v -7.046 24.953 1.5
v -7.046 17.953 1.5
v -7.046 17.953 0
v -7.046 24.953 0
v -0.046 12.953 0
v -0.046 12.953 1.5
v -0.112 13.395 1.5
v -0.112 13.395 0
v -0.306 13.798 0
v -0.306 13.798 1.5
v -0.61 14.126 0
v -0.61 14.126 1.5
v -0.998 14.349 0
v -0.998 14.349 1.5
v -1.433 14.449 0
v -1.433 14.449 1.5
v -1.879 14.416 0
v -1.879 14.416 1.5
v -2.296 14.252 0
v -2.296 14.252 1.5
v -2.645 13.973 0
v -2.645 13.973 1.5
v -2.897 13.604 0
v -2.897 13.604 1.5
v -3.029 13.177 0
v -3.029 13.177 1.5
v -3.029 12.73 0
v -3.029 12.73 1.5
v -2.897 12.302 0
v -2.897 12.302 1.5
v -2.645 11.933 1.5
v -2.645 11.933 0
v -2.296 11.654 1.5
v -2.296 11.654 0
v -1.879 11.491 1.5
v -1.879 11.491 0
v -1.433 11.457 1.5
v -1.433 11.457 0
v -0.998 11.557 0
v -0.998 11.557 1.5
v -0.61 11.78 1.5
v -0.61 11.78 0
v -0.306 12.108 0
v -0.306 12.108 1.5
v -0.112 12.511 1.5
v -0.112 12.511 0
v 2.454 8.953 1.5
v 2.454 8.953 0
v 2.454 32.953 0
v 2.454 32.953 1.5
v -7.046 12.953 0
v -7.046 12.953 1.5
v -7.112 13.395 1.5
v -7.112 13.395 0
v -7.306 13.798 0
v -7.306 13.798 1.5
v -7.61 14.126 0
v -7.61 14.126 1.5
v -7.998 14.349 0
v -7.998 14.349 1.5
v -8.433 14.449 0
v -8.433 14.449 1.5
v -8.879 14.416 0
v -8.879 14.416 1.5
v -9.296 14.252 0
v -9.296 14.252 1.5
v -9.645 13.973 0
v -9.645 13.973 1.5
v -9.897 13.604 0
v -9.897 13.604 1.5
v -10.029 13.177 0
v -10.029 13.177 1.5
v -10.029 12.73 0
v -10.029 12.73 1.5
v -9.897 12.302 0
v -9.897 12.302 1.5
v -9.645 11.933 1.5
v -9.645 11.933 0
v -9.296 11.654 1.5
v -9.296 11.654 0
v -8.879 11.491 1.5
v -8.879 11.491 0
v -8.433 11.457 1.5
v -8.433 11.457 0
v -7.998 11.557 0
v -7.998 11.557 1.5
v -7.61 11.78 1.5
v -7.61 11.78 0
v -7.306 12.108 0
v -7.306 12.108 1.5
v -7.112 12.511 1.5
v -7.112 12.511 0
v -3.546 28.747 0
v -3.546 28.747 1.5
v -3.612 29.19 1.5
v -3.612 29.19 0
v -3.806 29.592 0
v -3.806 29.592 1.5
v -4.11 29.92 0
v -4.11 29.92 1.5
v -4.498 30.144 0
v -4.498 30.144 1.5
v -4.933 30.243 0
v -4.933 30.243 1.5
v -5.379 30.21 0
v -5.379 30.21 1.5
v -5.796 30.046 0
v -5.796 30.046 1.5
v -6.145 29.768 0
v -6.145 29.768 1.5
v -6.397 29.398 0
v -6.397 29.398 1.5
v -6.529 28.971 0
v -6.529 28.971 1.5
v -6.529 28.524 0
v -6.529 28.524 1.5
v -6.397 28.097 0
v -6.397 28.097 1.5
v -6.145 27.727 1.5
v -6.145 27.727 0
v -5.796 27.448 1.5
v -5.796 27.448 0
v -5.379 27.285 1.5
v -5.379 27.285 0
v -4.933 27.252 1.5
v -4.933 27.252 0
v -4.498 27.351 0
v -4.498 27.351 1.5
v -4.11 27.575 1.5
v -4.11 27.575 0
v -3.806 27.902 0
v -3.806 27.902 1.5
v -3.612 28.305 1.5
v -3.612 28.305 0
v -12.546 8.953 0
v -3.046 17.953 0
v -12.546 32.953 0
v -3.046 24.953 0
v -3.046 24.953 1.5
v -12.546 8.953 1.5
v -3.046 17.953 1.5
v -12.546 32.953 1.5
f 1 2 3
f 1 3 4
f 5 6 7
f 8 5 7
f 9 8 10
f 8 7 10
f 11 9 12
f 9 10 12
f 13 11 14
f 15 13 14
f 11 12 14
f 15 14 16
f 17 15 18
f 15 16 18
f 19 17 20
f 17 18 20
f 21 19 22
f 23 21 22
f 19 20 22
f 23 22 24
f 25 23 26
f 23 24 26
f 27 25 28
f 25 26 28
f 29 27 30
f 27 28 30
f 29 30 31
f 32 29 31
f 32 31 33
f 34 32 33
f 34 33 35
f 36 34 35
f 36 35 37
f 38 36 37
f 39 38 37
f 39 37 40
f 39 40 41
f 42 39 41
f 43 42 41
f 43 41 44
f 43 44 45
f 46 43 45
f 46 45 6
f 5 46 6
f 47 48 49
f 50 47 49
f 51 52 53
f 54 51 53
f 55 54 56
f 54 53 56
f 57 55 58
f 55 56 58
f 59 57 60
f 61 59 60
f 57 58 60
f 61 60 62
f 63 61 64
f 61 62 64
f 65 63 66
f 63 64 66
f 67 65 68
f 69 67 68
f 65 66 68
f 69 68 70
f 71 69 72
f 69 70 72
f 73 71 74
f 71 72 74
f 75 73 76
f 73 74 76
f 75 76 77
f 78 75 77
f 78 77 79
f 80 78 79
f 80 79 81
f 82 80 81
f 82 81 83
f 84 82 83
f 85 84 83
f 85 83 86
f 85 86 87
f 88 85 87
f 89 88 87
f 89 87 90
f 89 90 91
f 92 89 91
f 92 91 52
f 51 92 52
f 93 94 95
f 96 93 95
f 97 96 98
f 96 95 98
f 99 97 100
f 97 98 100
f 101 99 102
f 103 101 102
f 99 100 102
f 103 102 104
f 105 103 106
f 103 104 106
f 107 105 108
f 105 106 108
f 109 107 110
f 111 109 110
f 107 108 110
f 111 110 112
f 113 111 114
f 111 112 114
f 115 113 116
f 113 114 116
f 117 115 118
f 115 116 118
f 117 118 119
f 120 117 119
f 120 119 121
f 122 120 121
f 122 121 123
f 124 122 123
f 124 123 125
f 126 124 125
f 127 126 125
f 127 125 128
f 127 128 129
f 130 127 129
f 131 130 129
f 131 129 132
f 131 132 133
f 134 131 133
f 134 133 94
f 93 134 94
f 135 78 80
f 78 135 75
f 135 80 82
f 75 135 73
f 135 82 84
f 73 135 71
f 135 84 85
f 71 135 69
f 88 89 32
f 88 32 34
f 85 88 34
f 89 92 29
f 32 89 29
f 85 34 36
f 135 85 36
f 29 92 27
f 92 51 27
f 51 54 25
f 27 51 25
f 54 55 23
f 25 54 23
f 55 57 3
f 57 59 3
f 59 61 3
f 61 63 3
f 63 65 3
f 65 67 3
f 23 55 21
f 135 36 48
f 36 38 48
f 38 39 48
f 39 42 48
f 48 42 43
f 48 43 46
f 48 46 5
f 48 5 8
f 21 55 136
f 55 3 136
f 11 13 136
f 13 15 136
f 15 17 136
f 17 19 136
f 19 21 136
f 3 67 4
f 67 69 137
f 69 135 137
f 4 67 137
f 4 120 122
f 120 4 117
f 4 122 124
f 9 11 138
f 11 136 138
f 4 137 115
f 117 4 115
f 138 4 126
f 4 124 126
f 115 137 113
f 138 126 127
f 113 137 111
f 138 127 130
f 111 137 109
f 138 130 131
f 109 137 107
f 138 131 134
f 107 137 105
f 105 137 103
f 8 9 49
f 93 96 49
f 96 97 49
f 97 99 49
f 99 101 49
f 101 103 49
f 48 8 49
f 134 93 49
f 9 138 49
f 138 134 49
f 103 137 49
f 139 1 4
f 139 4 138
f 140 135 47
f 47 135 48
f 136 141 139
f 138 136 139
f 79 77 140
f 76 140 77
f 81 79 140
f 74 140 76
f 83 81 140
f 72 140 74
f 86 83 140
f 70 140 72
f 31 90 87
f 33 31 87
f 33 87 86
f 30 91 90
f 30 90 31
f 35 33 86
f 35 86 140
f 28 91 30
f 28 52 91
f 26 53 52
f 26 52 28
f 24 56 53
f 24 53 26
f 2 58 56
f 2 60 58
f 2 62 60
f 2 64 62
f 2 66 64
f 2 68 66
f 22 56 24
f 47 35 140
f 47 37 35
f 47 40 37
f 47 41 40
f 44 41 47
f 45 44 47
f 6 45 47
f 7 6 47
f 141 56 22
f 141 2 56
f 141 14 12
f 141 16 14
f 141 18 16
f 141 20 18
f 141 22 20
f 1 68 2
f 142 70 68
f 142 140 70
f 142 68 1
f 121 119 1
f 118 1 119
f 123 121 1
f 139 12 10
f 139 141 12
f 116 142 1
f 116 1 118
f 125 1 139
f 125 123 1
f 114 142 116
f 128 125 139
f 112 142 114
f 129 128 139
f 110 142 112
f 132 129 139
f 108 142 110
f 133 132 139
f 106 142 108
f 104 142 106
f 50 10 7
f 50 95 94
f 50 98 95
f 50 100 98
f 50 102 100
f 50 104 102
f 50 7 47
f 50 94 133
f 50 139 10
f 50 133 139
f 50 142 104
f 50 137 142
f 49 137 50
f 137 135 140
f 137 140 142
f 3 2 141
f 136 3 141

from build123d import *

# Parameters (mm, degrees)
ESQUISSE1_W      = 15
ESQUISSE1_H      = 24
EXTRUSION1_DEPTH = 1.5
ESQUISSE2_R      = 1.5
ESQUISSE2_W      = 4
ESQUISSE2_H      = 7
EXTRUSION2_DEPTH = 2


with BuildPart() as part:
    # Esquisse1 → Extrusion1 (new body)
    with BuildSketch(Plane.XY):
        with Locations((-5.045528485, 20.953157895)):
            Rectangle(ESQUISSE1_W, ESQUISSE1_H)
    extrude(amount=EXTRUSION1_DEPTH)

    # Esquisse2 → Extrusion2 (cut)
    with BuildSketch(Plane.XY.offset(1.5)):
        with Locations((-8.545528485, 12.953157895)):
            Circle(ESQUISSE2_R)
        with Locations((-1.545528485, 12.953157895)):
            Circle(ESQUISSE2_R)
        with Locations((-5.045528485, 28.747386529)):
            Circle(ESQUISSE2_R)
        with Locations((-5.045528485, 21.453157895)):
            Rectangle(ESQUISSE2_W, ESQUISSE2_H)
    extrude(amount=-EXTRUSION2_DEPTH, mode=Mode.SUBTRACT)


solid = part.part
